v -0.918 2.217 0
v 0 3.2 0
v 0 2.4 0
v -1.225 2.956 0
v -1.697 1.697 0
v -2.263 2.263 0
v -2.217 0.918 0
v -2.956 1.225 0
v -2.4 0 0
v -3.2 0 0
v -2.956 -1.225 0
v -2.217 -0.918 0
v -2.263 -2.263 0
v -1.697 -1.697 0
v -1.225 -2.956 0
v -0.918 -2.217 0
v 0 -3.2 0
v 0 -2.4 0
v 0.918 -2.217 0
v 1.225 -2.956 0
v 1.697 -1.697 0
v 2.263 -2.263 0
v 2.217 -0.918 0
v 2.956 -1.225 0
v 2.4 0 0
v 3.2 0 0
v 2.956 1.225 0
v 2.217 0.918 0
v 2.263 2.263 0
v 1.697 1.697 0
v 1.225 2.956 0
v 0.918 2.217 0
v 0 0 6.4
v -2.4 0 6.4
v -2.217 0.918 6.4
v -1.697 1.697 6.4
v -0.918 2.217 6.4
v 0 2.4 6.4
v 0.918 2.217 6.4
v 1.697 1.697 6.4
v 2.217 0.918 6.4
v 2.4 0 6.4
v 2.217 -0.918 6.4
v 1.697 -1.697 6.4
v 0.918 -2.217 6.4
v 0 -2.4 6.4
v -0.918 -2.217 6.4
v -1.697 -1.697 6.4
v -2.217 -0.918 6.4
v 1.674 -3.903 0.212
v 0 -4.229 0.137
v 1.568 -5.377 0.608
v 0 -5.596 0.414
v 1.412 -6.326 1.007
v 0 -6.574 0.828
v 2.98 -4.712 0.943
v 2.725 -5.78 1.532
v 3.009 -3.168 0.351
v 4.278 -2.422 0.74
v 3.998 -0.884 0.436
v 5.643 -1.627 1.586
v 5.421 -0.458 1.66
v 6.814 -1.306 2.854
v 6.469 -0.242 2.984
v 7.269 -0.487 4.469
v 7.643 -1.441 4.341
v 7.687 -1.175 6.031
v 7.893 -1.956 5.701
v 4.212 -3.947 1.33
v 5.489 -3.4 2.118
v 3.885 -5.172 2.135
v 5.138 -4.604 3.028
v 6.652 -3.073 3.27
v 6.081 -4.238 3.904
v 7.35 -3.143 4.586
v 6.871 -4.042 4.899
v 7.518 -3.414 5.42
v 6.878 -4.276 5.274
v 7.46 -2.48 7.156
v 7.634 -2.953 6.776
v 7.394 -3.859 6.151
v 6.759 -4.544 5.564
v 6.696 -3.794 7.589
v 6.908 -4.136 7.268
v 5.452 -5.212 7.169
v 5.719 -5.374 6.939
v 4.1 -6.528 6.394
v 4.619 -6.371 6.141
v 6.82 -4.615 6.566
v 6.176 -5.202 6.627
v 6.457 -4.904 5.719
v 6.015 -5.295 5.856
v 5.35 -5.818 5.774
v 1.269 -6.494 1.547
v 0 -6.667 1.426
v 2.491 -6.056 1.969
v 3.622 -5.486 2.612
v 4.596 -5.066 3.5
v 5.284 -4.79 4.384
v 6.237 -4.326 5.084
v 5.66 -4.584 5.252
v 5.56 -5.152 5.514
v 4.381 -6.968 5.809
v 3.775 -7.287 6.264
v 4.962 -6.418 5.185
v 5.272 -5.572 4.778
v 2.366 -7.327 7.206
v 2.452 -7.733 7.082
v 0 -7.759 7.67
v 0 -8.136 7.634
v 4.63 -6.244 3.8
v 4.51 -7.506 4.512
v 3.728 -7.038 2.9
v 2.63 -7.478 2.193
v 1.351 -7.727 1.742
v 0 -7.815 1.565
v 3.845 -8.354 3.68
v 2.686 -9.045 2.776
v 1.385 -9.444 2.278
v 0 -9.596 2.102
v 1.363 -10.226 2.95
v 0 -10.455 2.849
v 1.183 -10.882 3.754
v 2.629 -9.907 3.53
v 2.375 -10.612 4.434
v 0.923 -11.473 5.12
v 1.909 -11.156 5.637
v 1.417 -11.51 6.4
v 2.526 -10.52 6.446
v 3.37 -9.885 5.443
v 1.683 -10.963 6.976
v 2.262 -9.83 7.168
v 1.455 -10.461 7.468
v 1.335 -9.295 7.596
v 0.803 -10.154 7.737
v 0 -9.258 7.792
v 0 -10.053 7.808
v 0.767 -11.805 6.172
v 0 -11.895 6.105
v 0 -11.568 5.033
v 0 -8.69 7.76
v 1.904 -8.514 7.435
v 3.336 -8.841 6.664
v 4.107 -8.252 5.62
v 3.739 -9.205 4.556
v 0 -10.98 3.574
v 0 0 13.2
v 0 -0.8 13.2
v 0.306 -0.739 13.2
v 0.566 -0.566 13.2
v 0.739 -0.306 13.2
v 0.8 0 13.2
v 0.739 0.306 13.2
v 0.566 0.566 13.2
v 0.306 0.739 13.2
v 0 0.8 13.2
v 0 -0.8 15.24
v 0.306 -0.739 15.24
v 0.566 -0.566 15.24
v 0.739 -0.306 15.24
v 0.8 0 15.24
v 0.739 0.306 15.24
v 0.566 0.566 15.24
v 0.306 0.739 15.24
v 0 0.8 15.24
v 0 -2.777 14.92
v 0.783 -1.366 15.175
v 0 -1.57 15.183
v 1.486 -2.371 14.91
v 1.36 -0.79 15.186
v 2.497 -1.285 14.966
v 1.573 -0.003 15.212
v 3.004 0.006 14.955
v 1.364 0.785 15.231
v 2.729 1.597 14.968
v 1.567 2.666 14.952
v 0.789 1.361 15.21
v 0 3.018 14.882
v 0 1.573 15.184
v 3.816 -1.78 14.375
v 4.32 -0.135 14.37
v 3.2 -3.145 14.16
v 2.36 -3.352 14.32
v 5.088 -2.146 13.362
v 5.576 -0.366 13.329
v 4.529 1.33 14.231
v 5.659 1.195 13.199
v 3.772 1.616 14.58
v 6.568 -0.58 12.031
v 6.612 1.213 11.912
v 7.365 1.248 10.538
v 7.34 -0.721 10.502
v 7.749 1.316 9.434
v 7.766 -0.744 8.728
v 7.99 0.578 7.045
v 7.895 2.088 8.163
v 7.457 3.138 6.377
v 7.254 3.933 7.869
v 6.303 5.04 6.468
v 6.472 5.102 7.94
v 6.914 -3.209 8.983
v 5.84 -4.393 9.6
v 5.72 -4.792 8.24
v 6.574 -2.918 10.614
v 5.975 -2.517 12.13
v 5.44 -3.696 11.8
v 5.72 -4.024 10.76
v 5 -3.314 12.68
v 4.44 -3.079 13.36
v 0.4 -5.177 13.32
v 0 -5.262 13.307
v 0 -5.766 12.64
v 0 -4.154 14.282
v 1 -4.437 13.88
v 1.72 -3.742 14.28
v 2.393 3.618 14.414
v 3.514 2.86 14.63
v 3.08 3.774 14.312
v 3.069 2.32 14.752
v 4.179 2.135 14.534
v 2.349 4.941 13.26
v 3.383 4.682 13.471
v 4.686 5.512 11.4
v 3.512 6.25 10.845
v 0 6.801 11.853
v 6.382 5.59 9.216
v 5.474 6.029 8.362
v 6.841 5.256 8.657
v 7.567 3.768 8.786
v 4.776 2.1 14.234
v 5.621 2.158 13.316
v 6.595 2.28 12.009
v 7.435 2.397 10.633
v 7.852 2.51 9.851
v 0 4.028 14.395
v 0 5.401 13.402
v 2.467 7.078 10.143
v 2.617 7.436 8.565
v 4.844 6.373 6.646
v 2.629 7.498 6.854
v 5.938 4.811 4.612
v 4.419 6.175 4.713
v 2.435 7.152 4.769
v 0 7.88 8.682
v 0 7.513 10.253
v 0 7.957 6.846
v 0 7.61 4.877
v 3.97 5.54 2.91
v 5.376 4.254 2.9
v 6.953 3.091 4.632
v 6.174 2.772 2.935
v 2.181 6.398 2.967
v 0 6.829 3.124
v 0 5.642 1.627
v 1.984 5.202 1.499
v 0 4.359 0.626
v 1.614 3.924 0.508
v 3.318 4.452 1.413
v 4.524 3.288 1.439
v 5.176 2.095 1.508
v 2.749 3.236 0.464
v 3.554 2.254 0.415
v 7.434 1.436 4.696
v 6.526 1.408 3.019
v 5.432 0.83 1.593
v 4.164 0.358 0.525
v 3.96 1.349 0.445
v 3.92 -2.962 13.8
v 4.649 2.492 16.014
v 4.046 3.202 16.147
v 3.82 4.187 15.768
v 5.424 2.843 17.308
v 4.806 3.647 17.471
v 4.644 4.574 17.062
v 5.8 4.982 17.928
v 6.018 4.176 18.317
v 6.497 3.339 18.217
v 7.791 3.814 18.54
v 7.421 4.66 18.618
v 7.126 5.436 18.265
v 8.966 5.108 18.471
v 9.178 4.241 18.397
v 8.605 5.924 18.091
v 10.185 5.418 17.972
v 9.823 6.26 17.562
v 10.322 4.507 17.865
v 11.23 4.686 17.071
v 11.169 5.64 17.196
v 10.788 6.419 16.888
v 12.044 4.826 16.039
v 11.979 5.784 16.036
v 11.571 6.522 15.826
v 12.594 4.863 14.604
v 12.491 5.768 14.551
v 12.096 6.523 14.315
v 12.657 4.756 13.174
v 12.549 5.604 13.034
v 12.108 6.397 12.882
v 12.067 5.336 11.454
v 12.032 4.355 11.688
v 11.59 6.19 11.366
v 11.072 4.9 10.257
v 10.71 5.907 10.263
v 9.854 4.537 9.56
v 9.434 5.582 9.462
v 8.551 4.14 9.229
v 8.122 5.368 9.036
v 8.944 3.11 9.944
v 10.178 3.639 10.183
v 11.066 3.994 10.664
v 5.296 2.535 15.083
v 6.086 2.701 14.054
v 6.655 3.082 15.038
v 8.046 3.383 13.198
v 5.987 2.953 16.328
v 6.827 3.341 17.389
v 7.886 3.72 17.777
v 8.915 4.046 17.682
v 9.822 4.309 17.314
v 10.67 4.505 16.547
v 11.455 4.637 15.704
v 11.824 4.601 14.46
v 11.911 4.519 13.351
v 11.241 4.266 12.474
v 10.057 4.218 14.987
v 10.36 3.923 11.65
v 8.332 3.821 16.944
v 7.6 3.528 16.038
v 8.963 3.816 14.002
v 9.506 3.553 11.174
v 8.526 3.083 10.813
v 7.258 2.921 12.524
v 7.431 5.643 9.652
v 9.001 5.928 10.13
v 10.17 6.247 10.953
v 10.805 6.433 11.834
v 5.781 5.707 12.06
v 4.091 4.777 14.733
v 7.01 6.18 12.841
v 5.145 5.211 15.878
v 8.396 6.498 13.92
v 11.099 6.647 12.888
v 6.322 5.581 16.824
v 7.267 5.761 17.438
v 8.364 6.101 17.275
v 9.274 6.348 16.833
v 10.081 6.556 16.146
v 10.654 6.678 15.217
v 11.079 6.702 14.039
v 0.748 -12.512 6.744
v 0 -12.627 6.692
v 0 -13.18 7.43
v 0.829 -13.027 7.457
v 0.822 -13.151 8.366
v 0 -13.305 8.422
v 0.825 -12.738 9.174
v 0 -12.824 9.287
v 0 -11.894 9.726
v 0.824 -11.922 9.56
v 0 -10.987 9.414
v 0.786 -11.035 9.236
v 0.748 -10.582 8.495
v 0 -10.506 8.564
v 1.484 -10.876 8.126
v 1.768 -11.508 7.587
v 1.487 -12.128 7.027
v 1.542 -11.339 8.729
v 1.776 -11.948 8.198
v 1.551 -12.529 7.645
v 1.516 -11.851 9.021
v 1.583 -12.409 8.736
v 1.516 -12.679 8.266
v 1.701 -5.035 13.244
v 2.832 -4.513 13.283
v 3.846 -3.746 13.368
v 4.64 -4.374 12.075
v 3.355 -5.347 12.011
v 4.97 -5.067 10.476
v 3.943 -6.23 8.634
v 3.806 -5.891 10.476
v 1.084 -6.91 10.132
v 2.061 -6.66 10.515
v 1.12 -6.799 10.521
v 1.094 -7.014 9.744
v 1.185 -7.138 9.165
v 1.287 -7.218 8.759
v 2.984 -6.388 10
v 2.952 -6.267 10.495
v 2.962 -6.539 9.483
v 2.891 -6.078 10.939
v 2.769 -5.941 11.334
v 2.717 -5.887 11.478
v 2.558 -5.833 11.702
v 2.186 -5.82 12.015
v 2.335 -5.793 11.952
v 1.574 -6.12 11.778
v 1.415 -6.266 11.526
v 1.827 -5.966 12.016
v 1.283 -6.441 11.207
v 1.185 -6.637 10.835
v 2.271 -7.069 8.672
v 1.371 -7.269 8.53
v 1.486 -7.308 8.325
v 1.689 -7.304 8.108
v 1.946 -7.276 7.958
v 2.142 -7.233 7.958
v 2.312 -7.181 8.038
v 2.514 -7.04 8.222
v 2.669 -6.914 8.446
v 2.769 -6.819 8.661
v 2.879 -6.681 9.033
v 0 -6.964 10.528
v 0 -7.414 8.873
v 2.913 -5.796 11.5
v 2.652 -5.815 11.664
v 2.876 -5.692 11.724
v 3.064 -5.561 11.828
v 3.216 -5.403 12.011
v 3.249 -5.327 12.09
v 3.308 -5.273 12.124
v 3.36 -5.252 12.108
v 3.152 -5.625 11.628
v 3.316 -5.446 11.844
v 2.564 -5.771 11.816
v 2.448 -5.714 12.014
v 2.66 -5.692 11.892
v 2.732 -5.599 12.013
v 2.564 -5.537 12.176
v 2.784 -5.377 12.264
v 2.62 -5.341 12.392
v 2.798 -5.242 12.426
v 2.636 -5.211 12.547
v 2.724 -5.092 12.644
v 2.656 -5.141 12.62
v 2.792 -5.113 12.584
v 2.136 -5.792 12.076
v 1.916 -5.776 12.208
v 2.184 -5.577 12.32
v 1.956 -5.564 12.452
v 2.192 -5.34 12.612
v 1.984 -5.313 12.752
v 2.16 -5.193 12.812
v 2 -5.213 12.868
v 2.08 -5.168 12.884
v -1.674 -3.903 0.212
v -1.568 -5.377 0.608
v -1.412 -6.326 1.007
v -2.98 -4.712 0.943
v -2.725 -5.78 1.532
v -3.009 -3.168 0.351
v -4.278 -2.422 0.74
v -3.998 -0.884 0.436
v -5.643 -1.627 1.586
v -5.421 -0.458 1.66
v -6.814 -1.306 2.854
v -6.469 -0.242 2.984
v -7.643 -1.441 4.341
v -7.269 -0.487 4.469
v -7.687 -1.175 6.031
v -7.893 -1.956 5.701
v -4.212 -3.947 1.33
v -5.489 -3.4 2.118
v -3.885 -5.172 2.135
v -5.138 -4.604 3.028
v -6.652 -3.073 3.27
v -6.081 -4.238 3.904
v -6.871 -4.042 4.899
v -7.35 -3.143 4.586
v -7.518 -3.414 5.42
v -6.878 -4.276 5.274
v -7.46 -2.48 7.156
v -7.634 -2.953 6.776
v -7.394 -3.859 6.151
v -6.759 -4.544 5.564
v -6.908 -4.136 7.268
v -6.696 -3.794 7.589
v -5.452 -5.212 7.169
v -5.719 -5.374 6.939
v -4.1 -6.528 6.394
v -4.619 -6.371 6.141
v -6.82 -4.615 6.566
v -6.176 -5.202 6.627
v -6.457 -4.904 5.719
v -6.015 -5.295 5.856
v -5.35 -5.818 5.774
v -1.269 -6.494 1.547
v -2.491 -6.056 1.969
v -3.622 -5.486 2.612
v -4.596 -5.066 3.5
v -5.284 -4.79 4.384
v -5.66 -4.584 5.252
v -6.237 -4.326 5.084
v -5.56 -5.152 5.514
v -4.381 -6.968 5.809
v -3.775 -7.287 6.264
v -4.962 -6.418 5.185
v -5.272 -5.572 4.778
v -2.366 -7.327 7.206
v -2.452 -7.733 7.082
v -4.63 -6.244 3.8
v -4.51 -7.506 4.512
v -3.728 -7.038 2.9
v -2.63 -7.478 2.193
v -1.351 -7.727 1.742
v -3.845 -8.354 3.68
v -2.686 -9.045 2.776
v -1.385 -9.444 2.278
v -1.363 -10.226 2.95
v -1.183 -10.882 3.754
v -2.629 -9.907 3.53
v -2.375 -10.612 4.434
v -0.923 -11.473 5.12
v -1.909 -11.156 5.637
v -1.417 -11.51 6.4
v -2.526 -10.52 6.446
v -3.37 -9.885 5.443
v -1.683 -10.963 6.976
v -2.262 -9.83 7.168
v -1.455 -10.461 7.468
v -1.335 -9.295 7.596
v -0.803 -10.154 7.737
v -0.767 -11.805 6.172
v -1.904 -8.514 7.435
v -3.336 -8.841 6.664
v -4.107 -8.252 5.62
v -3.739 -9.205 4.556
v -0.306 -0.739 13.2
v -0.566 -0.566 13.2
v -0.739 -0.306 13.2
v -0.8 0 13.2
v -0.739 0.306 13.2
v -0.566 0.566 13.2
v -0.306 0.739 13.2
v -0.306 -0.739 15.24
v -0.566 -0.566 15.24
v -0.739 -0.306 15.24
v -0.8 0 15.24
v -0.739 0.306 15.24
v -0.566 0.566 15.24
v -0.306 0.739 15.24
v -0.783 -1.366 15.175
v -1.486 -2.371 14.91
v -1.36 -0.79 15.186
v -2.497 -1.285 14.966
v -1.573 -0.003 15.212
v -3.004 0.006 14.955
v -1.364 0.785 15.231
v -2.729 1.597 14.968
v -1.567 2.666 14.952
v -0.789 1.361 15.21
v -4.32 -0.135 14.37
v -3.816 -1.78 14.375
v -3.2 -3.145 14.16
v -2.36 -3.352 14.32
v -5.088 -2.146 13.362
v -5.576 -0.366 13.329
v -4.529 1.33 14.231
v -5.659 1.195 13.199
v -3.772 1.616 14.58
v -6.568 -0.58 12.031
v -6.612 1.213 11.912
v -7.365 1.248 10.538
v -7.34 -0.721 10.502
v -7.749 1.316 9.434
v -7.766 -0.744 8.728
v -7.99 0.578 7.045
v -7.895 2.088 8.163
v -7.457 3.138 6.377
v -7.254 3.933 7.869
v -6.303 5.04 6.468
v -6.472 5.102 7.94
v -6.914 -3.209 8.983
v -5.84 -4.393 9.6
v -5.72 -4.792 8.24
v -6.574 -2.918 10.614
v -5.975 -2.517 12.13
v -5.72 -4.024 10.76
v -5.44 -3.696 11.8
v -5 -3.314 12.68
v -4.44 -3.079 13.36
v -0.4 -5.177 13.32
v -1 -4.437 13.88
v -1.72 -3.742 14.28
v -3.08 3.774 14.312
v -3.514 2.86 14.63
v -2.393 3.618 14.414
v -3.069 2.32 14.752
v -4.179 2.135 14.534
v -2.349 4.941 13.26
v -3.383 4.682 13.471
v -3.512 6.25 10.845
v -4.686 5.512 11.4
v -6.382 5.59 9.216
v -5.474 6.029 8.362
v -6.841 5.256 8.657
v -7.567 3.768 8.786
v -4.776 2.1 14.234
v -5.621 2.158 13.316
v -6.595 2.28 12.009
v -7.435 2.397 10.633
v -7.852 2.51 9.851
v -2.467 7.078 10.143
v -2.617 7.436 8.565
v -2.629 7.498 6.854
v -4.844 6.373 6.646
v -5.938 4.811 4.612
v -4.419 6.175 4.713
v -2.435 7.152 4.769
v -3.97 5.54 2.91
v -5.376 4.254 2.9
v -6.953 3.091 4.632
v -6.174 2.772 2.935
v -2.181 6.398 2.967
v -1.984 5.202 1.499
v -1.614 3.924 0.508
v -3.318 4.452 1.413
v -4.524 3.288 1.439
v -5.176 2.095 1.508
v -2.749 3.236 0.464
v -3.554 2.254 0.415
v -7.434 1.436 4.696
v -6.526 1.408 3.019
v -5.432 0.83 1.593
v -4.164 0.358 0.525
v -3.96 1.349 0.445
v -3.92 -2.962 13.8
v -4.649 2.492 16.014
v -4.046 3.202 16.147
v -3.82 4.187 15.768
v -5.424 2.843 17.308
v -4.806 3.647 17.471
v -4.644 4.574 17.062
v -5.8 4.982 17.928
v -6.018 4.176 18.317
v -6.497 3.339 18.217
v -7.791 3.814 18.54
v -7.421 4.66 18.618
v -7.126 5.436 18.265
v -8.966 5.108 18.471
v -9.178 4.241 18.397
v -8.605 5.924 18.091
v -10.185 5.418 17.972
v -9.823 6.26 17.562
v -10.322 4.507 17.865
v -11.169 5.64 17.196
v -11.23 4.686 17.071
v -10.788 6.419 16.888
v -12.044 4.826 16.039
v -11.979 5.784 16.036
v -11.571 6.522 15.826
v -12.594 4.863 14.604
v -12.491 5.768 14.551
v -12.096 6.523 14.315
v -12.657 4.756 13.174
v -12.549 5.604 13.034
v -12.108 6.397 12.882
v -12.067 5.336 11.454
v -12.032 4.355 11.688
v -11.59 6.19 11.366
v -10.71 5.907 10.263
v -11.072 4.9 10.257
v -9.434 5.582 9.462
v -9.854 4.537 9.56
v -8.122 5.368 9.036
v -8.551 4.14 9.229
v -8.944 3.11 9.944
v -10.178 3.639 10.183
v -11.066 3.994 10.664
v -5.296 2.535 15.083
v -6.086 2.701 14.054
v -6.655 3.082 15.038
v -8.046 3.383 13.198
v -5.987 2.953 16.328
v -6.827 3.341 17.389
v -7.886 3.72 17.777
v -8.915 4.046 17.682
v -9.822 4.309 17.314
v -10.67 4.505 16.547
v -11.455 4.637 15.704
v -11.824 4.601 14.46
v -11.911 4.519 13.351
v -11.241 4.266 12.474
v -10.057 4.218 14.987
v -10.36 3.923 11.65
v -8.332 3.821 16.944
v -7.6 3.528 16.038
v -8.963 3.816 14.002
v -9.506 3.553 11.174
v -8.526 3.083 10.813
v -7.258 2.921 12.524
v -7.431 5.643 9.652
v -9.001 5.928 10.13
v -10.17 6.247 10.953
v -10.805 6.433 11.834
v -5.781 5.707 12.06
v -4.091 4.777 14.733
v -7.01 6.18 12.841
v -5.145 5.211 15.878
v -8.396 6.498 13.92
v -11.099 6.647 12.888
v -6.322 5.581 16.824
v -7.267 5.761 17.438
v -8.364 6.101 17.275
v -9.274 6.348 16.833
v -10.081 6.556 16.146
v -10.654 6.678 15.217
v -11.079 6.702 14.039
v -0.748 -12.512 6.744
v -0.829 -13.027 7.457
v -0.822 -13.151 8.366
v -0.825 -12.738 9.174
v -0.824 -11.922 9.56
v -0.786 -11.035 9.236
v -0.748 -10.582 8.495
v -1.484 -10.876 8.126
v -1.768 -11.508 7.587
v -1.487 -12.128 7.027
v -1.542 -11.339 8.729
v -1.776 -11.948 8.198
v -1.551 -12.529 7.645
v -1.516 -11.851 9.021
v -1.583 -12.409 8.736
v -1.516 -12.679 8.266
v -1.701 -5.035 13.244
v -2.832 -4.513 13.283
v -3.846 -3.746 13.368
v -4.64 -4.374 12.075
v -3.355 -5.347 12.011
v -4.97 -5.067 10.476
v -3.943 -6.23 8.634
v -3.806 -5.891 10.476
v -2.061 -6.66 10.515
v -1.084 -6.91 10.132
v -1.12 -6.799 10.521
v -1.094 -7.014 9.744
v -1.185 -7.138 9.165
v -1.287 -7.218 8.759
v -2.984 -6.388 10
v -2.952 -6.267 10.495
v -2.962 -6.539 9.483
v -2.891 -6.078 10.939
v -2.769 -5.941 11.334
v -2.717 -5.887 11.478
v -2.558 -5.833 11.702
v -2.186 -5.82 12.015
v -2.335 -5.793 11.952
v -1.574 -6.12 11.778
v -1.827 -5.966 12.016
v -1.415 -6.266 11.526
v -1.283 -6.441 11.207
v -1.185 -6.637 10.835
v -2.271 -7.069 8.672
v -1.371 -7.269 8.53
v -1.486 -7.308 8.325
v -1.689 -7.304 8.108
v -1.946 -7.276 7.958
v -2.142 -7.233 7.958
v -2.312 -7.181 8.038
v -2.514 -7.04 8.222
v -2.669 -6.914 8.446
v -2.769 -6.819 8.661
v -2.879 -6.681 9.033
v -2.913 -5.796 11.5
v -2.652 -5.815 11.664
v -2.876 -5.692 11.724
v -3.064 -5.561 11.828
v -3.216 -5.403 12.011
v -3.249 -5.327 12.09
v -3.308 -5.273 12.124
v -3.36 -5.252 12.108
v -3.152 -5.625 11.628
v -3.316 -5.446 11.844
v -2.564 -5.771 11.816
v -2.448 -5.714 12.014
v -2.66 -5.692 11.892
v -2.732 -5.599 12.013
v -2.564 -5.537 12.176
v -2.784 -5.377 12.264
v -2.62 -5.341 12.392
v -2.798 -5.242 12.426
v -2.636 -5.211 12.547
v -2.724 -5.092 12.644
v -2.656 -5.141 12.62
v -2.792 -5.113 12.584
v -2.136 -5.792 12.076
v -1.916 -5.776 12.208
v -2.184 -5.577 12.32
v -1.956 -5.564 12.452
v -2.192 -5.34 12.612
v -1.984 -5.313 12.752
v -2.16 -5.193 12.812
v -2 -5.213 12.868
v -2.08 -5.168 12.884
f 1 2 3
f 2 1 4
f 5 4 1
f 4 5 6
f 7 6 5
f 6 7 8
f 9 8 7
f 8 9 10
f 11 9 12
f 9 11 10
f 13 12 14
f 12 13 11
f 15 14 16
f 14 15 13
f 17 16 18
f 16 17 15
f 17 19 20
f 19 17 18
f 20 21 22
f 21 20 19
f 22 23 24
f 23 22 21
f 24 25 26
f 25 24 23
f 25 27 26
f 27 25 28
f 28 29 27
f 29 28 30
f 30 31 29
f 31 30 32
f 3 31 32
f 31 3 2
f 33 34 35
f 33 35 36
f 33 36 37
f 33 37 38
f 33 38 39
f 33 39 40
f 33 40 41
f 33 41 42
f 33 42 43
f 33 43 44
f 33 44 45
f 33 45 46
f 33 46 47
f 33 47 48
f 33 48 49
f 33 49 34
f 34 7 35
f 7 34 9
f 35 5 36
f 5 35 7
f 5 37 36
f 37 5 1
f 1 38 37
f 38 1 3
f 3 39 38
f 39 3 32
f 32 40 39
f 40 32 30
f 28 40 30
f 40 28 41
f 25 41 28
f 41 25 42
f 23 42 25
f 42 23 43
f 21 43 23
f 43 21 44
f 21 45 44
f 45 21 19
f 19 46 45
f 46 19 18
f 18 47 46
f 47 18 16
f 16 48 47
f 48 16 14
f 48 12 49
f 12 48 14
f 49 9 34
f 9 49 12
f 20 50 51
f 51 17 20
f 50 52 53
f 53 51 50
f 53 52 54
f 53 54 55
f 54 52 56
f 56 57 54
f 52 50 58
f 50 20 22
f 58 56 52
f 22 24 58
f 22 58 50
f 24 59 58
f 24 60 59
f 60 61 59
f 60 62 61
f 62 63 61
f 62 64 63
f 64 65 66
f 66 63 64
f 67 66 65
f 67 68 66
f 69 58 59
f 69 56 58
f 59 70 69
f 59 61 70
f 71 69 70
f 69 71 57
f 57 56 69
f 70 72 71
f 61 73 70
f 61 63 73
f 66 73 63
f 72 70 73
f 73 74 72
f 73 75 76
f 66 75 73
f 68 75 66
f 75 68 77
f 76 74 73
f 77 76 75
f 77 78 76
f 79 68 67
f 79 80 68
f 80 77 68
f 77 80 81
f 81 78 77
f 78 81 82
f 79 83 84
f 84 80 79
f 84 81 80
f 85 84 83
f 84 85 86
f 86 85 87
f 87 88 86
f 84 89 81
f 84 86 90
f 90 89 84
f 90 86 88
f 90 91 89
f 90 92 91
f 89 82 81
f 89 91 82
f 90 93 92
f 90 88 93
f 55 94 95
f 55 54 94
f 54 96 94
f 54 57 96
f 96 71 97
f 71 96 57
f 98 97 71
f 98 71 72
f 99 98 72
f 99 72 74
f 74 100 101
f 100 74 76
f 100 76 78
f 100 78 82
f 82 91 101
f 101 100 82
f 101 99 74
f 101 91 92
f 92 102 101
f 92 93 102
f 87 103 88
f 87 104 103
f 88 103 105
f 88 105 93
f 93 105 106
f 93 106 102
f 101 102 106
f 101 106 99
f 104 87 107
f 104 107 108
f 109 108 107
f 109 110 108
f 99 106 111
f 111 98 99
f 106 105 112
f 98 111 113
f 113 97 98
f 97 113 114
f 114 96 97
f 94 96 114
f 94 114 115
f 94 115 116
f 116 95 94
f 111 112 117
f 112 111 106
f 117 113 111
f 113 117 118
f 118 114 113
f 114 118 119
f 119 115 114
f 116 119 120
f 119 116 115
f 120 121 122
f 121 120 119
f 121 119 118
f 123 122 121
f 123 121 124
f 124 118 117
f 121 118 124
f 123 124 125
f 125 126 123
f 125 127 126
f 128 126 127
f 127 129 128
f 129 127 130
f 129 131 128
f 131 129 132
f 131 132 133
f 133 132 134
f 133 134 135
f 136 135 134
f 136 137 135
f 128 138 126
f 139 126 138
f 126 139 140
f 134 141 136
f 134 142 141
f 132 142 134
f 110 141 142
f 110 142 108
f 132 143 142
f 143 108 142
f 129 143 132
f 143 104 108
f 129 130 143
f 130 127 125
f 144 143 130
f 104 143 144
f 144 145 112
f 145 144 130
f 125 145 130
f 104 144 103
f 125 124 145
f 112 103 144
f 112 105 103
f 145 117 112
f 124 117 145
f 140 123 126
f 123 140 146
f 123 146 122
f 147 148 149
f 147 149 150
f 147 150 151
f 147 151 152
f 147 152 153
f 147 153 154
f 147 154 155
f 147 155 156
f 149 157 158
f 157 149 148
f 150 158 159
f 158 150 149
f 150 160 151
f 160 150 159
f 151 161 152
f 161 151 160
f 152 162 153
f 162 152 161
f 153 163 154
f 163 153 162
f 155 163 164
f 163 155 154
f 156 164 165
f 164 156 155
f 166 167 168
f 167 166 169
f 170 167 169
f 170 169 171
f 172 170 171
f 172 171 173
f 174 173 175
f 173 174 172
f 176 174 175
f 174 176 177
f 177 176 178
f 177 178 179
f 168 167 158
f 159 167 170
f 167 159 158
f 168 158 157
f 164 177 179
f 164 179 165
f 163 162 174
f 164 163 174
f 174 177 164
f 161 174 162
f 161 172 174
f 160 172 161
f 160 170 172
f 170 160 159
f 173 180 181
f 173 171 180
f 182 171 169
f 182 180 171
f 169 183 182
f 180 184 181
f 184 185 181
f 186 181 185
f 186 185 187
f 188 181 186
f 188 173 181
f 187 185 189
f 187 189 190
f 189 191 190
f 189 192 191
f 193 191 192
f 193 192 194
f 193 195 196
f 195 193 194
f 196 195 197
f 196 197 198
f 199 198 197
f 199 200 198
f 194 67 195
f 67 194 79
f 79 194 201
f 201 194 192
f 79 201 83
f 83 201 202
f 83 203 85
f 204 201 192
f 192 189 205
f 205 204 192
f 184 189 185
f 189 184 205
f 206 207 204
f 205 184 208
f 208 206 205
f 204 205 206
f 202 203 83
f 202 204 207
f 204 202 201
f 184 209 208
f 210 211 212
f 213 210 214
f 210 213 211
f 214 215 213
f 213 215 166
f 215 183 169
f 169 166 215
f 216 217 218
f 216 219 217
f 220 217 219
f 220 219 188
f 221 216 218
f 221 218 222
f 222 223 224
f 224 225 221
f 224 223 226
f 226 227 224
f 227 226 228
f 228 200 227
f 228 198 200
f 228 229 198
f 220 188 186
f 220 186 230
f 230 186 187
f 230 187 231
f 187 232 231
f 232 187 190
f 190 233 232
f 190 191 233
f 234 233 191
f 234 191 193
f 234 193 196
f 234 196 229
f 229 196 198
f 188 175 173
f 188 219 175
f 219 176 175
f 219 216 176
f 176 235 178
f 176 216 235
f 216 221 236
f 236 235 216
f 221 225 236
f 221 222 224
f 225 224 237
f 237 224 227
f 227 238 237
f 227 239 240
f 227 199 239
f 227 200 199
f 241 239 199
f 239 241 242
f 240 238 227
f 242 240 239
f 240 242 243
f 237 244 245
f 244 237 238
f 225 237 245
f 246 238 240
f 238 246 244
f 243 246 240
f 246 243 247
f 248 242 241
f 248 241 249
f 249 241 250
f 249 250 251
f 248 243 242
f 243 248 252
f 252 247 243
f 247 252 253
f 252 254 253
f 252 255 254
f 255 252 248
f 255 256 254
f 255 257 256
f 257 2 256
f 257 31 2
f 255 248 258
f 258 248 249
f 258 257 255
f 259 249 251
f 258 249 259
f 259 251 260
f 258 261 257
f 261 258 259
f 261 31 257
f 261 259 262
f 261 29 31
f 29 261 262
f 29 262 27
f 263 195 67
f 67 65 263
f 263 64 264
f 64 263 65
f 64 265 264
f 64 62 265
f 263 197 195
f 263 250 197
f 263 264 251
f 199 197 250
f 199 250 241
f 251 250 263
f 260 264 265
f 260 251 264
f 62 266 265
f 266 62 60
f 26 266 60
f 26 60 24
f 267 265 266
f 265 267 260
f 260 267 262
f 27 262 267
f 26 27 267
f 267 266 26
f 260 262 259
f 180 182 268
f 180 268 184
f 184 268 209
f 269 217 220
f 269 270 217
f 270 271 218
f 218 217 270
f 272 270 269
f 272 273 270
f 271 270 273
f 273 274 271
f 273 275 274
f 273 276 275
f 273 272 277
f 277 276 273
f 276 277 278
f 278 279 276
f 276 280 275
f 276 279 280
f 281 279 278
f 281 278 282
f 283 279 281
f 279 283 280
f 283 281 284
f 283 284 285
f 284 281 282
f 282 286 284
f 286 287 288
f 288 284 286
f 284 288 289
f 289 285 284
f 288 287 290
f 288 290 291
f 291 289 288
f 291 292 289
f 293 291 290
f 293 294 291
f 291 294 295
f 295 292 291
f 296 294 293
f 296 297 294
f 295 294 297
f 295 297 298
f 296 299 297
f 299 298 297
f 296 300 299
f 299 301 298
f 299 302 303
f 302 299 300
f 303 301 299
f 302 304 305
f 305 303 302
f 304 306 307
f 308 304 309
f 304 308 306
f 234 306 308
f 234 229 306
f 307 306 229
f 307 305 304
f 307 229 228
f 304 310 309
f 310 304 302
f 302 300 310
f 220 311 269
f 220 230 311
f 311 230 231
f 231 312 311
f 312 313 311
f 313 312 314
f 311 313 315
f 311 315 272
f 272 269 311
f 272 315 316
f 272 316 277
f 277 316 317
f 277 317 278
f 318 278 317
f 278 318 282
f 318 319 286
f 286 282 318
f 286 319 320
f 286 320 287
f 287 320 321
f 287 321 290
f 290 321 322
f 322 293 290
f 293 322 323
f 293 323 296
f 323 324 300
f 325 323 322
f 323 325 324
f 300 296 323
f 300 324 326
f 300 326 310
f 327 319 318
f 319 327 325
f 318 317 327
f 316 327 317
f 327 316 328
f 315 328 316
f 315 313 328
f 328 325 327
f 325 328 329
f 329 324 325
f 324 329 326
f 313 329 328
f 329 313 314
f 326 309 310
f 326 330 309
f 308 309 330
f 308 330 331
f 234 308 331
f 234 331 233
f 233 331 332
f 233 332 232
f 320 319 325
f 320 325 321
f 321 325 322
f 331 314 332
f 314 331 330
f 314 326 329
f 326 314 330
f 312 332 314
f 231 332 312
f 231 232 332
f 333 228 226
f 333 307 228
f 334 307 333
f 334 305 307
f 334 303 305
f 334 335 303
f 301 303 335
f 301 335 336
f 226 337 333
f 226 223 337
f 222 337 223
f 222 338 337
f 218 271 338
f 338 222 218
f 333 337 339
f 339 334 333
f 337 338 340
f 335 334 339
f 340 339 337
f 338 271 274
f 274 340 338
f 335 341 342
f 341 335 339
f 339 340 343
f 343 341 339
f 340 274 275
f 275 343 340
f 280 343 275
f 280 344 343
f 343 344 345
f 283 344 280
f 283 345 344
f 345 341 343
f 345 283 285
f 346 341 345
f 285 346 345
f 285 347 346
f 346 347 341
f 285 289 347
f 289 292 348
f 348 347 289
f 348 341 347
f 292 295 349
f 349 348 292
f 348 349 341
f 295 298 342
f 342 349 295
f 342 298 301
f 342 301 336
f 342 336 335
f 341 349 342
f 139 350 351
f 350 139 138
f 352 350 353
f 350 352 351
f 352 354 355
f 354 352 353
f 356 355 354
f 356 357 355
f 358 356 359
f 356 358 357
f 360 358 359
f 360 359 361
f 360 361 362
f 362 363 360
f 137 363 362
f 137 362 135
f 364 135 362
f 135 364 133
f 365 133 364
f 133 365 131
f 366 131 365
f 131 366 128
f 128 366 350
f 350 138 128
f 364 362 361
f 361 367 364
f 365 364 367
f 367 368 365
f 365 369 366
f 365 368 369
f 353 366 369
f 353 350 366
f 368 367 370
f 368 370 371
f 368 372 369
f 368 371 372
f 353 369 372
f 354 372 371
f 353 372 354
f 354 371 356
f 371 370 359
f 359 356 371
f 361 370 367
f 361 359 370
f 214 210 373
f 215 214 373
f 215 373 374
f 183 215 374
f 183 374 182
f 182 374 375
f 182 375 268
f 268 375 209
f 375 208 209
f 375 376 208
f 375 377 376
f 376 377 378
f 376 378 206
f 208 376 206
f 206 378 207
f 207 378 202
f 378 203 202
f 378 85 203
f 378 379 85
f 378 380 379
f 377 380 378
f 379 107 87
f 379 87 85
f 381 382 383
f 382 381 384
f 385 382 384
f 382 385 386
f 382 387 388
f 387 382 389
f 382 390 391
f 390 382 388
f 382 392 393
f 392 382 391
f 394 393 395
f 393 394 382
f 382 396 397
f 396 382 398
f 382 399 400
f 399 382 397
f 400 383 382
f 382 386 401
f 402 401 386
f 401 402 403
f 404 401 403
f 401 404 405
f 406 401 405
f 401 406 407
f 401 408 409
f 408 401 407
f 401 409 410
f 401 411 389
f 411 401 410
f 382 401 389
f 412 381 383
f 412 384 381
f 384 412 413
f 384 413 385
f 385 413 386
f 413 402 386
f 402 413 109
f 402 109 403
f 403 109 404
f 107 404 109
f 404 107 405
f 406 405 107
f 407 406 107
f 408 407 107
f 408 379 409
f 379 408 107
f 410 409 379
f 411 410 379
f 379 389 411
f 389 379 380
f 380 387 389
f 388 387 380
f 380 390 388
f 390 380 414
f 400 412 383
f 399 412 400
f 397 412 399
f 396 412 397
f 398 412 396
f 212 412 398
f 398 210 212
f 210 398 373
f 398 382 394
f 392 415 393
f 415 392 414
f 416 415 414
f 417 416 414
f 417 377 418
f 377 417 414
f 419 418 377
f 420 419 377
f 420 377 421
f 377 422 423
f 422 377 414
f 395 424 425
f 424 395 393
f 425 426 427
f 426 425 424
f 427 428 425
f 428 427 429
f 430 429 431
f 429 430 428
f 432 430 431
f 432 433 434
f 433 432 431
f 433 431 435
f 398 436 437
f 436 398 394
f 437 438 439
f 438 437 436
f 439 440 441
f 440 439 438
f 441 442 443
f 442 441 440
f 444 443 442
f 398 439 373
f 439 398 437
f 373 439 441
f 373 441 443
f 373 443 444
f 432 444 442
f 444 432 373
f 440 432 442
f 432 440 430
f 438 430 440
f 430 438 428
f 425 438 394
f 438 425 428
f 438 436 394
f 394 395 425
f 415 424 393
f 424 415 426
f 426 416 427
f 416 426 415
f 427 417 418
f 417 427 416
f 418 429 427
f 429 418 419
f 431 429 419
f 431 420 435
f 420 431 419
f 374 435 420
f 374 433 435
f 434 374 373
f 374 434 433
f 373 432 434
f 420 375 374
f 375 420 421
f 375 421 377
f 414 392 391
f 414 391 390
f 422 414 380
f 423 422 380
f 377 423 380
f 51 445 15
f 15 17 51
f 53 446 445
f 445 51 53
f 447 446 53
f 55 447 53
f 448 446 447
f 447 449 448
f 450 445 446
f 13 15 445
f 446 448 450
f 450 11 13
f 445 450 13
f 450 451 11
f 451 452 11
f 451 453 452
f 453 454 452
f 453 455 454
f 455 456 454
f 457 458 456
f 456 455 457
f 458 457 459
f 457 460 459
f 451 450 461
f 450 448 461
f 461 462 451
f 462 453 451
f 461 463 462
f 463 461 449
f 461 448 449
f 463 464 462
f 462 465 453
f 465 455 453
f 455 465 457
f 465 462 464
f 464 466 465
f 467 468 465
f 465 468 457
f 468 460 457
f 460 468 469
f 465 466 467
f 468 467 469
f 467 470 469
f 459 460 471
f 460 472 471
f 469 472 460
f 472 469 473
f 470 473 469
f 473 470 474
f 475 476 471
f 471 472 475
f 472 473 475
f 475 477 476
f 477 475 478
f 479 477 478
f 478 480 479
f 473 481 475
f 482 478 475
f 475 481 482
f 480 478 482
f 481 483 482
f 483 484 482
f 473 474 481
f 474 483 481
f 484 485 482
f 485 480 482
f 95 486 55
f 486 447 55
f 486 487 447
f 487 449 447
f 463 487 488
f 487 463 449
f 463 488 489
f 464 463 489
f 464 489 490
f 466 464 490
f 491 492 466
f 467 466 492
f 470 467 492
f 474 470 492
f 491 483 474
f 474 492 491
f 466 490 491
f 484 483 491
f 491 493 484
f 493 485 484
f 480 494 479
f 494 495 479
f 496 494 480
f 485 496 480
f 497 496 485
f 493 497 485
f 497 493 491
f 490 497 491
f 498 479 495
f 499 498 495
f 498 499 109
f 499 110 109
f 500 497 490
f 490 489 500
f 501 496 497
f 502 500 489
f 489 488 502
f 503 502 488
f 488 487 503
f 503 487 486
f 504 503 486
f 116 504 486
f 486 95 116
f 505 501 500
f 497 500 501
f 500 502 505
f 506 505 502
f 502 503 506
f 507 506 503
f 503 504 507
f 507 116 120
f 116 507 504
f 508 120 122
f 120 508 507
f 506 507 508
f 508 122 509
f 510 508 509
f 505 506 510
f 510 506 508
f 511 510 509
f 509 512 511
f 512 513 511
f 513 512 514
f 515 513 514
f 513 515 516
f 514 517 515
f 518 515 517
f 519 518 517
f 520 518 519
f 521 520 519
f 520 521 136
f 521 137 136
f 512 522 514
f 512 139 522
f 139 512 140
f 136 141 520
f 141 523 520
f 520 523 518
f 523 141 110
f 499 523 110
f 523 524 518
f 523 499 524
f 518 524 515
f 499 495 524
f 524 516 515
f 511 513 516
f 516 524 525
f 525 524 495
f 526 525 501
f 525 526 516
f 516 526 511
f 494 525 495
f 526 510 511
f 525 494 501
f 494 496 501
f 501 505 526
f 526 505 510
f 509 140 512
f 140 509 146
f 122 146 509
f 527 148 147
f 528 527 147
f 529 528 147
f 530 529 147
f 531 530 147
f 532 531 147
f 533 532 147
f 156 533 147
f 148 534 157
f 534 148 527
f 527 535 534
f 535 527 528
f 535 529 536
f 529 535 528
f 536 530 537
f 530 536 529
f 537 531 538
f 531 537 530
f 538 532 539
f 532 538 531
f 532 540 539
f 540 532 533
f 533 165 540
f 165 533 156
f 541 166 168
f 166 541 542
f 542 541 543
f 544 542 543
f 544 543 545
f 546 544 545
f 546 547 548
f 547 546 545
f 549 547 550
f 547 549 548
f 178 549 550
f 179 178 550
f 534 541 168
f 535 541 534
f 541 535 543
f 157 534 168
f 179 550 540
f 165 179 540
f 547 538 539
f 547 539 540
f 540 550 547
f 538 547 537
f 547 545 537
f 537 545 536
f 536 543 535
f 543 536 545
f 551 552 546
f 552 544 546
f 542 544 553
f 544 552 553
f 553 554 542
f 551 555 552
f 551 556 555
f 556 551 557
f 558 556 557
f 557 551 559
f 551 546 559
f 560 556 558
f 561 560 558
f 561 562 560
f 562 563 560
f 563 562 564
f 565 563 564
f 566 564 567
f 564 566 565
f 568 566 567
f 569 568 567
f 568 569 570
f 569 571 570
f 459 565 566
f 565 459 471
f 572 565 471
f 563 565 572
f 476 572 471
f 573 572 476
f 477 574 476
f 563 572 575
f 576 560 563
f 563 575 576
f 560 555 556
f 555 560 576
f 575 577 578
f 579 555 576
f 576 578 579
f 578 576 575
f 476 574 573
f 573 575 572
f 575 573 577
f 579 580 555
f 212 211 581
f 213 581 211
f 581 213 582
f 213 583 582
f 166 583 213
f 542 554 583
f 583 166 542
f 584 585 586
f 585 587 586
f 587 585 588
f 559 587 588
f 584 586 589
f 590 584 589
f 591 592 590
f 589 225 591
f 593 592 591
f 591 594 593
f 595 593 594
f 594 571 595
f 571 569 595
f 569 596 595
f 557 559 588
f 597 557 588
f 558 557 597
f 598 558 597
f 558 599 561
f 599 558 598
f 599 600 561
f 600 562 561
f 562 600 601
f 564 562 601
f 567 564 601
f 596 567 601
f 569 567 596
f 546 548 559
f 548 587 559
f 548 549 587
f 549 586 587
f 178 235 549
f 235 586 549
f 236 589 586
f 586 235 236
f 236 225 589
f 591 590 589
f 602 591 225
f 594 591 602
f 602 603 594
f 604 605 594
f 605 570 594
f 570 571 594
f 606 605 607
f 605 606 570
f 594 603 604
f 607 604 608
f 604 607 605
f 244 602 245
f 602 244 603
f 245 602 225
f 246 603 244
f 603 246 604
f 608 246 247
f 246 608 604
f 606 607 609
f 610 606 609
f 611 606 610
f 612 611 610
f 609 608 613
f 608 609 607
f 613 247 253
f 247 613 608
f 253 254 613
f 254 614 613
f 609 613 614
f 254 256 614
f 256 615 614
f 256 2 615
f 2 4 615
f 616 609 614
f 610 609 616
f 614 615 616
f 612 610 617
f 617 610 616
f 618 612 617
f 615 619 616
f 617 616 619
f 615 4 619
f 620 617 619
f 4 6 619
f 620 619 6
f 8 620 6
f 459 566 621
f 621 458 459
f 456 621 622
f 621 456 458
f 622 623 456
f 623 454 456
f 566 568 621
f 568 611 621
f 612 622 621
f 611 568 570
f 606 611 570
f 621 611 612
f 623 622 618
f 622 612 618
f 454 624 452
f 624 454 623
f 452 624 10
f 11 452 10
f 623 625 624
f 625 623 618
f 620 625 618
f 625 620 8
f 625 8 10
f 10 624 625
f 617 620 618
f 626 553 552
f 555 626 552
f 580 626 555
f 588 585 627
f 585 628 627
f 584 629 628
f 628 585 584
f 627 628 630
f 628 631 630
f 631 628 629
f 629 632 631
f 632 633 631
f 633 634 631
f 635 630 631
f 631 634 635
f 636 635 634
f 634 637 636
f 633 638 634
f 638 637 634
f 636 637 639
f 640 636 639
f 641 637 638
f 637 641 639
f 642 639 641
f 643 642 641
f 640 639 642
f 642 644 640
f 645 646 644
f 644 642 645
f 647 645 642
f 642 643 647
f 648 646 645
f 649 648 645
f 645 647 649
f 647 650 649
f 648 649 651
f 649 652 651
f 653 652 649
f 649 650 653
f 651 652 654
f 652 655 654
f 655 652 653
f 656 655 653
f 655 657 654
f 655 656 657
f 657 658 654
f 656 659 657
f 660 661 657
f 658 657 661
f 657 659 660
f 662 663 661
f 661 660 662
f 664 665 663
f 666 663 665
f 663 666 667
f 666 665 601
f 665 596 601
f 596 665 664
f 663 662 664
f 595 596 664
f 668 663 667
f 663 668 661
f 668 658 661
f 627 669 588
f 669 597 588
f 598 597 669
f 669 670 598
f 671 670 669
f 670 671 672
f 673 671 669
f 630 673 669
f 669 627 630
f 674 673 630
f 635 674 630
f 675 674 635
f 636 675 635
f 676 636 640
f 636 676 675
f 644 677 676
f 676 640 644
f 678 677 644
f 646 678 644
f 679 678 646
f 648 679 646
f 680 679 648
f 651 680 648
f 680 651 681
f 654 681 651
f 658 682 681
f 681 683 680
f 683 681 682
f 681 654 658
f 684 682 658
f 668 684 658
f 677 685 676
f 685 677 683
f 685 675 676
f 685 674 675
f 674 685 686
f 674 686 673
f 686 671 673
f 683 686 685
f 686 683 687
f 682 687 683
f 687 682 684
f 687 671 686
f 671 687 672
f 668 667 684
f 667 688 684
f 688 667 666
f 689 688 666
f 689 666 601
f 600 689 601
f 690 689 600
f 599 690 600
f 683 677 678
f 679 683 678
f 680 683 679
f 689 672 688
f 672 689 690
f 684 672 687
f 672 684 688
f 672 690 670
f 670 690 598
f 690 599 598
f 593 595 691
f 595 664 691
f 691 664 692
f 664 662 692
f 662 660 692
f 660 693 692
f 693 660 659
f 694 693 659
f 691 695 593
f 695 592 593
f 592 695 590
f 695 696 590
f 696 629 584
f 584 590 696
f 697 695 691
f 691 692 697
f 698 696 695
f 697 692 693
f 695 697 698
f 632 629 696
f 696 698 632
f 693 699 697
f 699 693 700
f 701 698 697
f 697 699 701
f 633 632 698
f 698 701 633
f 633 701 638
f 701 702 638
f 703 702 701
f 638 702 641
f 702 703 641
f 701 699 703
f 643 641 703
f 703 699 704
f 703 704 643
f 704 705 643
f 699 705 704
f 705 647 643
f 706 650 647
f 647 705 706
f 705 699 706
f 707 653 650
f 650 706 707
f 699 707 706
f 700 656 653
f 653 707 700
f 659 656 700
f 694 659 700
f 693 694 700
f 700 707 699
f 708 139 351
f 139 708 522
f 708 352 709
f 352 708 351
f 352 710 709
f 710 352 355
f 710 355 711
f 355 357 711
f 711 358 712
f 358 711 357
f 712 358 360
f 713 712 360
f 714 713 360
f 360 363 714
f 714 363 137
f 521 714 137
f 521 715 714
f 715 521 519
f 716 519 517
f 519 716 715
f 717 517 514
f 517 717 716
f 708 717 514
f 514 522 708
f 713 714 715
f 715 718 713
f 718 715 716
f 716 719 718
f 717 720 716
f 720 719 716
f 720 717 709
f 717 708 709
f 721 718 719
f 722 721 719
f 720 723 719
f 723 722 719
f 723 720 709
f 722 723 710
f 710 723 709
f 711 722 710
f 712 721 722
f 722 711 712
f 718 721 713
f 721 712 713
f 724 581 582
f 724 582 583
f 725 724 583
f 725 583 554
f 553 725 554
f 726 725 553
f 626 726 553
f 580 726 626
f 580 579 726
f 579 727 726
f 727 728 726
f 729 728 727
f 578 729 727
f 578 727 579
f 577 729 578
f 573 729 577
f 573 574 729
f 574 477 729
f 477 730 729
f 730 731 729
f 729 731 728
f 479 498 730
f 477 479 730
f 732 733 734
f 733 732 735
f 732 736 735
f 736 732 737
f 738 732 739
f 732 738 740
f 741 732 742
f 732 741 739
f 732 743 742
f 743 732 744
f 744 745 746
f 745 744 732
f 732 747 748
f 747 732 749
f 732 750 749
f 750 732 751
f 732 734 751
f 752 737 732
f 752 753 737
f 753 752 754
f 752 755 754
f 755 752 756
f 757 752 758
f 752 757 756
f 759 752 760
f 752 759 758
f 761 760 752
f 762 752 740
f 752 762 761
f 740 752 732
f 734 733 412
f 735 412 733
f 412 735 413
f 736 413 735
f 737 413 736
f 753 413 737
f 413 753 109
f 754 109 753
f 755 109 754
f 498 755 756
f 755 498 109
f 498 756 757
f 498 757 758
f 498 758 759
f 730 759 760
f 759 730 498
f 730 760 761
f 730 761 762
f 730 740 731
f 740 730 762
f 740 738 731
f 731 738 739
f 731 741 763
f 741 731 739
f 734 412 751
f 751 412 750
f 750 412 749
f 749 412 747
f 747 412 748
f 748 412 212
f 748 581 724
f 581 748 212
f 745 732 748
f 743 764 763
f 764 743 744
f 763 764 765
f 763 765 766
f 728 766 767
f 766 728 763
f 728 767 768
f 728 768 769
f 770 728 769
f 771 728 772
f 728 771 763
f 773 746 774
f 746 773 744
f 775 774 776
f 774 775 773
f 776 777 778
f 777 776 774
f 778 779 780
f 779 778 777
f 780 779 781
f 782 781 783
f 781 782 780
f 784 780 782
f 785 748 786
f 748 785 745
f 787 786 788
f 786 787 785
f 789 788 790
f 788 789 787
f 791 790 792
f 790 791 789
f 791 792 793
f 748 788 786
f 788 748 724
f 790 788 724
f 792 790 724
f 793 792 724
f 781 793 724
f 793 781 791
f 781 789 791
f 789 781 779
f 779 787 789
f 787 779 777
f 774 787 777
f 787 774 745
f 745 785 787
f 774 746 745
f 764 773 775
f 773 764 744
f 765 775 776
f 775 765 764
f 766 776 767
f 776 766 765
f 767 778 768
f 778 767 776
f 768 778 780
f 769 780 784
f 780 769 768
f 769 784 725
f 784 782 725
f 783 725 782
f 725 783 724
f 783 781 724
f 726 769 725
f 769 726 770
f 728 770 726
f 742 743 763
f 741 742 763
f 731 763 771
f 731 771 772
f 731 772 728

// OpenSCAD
use <../lib.scad>
use <s/24629p04s05.scad>
use <s/24629s01.scad>
use <s/24629s02.scad>
use <s/24629s03.scad>
use <s/24629s04.scad>
use <../p/stud4o.scad>
function ldraw_lib__24629p04() = [
// 0 Minifig Head Mouse with Black Ears, Nose, Skull and Eyes with Eyelashes Pattern
// 0 Name: 24629p04.dat
// 0 Author: Philippe Hurbain [Philo]
// 0 !LDRAW_ORG Part UPDATE 2024-05
// 0 !LICENSE Licensed under CC BY 4.0 : see CAreadme.txt
// 
// 0 BFC CERTIFY CCW
  [0,"BFC","CERTIFY"],
  [0,"BFC","CCW"],
// 
// 0 !KEYWORDS Black and White, Bricklink 24629pb04, Disney, Mickey
// 0 !KEYWORDS Rebrickable 24629pr0004, Set 31317, Steamboat Willie, Vintage
// 
// 0 !HISTORY 2022-02-06 {LEGO Instructions App} Original part shape
// 0 !HISTORY 2022-02-07 [Philo] File preparation for LDraw Parts Tracker
// 0 !HISTORY 2024-06-30 [OrionP] Official Update 2024-05
// 
// 
// 1 16 0 -16 0 1 0 0 0 -4 0 0 0 1 stud4o.dat
  [1,16,0,-16,0,1,0,0,0,-4,0,0,0,1, ldraw_lib__stud4o()],
// 1 16 0 0 0 1 0 0 0 1 0 0 0 1 s\24629s01.dat
  [1,16,0,0,0,1,0,0,0,1,0,0,0,1, ldraw_lib__s__24629s01()],
// 1 0 0 0 0 1 0 0 0 1 0 0 0 1 s\24629s02.dat
  [1,0,0,0,0,1,0,0,0,1,0,0,0,1, ldraw_lib__s__24629s02()],
// 1 0 0 0 0 1 0 0 0 1 0 0 0 1 s\24629s03.dat
  [1,0,0,0,0,1,0,0,0,1,0,0,0,1, ldraw_lib__s__24629s03()],
// 1 0 0 0 0 1 0 0 0 1 0 0 0 1 s\24629s04.dat
  [1,0,0,0,0,1,0,0,0,1,0,0,0,1, ldraw_lib__s__24629s04()],
// 1 16 0 0 0 1 0 0 0 1 0 0 0 1 s\24629p04s05.dat
  [1,16,0,0,0,1,0,0,0,1,0,0,0,1, ldraw_lib__s__24629p04s05()],
// 1 16 0 0 0 -1 0 0 0 1 0 0 0 1 s\24629s01.dat
  [1,16,0,0,0,-1,0,0,0,1,0,0,0,1, ldraw_lib__s__24629s01()],
// 1 0 0 0 0 -1 0 0 0 1 0 0 0 1 s\24629s02.dat
  [1,0,0,0,0,-1,0,0,0,1,0,0,0,1, ldraw_lib__s__24629s02()],
// 1 0 0 0 0 -1 0 0 0 1 0 0 0 1 s\24629s03.dat
  [1,0,0,0,0,-1,0,0,0,1,0,0,0,1, ldraw_lib__s__24629s03()],
// 1 0 0 0 0 -1 0 0 0 1 0 0 0 1 s\24629s04.dat
  [1,0,0,0,0,-1,0,0,0,1,0,0,0,1, ldraw_lib__s__24629s04()],
// 1 16 0 0 0 -1 0 0 0 1 0 0 0 1 s\24629p04s05.dat
  [1,16,0,0,0,-1,0,0,0,1,0,0,0,1, ldraw_lib__s__24629p04s05()],
];
module ldraw_lib__24629p04(step=0, col=false, unit=2/5, alt=false, line=0.2, solid=!$preview)
    makepoly(ldraw_lib__24629p04(), step=step, col=col, unit=unit, alt=alt, line=line, solid=solid);
ldraw_lib__24629p04(line=0.2);
